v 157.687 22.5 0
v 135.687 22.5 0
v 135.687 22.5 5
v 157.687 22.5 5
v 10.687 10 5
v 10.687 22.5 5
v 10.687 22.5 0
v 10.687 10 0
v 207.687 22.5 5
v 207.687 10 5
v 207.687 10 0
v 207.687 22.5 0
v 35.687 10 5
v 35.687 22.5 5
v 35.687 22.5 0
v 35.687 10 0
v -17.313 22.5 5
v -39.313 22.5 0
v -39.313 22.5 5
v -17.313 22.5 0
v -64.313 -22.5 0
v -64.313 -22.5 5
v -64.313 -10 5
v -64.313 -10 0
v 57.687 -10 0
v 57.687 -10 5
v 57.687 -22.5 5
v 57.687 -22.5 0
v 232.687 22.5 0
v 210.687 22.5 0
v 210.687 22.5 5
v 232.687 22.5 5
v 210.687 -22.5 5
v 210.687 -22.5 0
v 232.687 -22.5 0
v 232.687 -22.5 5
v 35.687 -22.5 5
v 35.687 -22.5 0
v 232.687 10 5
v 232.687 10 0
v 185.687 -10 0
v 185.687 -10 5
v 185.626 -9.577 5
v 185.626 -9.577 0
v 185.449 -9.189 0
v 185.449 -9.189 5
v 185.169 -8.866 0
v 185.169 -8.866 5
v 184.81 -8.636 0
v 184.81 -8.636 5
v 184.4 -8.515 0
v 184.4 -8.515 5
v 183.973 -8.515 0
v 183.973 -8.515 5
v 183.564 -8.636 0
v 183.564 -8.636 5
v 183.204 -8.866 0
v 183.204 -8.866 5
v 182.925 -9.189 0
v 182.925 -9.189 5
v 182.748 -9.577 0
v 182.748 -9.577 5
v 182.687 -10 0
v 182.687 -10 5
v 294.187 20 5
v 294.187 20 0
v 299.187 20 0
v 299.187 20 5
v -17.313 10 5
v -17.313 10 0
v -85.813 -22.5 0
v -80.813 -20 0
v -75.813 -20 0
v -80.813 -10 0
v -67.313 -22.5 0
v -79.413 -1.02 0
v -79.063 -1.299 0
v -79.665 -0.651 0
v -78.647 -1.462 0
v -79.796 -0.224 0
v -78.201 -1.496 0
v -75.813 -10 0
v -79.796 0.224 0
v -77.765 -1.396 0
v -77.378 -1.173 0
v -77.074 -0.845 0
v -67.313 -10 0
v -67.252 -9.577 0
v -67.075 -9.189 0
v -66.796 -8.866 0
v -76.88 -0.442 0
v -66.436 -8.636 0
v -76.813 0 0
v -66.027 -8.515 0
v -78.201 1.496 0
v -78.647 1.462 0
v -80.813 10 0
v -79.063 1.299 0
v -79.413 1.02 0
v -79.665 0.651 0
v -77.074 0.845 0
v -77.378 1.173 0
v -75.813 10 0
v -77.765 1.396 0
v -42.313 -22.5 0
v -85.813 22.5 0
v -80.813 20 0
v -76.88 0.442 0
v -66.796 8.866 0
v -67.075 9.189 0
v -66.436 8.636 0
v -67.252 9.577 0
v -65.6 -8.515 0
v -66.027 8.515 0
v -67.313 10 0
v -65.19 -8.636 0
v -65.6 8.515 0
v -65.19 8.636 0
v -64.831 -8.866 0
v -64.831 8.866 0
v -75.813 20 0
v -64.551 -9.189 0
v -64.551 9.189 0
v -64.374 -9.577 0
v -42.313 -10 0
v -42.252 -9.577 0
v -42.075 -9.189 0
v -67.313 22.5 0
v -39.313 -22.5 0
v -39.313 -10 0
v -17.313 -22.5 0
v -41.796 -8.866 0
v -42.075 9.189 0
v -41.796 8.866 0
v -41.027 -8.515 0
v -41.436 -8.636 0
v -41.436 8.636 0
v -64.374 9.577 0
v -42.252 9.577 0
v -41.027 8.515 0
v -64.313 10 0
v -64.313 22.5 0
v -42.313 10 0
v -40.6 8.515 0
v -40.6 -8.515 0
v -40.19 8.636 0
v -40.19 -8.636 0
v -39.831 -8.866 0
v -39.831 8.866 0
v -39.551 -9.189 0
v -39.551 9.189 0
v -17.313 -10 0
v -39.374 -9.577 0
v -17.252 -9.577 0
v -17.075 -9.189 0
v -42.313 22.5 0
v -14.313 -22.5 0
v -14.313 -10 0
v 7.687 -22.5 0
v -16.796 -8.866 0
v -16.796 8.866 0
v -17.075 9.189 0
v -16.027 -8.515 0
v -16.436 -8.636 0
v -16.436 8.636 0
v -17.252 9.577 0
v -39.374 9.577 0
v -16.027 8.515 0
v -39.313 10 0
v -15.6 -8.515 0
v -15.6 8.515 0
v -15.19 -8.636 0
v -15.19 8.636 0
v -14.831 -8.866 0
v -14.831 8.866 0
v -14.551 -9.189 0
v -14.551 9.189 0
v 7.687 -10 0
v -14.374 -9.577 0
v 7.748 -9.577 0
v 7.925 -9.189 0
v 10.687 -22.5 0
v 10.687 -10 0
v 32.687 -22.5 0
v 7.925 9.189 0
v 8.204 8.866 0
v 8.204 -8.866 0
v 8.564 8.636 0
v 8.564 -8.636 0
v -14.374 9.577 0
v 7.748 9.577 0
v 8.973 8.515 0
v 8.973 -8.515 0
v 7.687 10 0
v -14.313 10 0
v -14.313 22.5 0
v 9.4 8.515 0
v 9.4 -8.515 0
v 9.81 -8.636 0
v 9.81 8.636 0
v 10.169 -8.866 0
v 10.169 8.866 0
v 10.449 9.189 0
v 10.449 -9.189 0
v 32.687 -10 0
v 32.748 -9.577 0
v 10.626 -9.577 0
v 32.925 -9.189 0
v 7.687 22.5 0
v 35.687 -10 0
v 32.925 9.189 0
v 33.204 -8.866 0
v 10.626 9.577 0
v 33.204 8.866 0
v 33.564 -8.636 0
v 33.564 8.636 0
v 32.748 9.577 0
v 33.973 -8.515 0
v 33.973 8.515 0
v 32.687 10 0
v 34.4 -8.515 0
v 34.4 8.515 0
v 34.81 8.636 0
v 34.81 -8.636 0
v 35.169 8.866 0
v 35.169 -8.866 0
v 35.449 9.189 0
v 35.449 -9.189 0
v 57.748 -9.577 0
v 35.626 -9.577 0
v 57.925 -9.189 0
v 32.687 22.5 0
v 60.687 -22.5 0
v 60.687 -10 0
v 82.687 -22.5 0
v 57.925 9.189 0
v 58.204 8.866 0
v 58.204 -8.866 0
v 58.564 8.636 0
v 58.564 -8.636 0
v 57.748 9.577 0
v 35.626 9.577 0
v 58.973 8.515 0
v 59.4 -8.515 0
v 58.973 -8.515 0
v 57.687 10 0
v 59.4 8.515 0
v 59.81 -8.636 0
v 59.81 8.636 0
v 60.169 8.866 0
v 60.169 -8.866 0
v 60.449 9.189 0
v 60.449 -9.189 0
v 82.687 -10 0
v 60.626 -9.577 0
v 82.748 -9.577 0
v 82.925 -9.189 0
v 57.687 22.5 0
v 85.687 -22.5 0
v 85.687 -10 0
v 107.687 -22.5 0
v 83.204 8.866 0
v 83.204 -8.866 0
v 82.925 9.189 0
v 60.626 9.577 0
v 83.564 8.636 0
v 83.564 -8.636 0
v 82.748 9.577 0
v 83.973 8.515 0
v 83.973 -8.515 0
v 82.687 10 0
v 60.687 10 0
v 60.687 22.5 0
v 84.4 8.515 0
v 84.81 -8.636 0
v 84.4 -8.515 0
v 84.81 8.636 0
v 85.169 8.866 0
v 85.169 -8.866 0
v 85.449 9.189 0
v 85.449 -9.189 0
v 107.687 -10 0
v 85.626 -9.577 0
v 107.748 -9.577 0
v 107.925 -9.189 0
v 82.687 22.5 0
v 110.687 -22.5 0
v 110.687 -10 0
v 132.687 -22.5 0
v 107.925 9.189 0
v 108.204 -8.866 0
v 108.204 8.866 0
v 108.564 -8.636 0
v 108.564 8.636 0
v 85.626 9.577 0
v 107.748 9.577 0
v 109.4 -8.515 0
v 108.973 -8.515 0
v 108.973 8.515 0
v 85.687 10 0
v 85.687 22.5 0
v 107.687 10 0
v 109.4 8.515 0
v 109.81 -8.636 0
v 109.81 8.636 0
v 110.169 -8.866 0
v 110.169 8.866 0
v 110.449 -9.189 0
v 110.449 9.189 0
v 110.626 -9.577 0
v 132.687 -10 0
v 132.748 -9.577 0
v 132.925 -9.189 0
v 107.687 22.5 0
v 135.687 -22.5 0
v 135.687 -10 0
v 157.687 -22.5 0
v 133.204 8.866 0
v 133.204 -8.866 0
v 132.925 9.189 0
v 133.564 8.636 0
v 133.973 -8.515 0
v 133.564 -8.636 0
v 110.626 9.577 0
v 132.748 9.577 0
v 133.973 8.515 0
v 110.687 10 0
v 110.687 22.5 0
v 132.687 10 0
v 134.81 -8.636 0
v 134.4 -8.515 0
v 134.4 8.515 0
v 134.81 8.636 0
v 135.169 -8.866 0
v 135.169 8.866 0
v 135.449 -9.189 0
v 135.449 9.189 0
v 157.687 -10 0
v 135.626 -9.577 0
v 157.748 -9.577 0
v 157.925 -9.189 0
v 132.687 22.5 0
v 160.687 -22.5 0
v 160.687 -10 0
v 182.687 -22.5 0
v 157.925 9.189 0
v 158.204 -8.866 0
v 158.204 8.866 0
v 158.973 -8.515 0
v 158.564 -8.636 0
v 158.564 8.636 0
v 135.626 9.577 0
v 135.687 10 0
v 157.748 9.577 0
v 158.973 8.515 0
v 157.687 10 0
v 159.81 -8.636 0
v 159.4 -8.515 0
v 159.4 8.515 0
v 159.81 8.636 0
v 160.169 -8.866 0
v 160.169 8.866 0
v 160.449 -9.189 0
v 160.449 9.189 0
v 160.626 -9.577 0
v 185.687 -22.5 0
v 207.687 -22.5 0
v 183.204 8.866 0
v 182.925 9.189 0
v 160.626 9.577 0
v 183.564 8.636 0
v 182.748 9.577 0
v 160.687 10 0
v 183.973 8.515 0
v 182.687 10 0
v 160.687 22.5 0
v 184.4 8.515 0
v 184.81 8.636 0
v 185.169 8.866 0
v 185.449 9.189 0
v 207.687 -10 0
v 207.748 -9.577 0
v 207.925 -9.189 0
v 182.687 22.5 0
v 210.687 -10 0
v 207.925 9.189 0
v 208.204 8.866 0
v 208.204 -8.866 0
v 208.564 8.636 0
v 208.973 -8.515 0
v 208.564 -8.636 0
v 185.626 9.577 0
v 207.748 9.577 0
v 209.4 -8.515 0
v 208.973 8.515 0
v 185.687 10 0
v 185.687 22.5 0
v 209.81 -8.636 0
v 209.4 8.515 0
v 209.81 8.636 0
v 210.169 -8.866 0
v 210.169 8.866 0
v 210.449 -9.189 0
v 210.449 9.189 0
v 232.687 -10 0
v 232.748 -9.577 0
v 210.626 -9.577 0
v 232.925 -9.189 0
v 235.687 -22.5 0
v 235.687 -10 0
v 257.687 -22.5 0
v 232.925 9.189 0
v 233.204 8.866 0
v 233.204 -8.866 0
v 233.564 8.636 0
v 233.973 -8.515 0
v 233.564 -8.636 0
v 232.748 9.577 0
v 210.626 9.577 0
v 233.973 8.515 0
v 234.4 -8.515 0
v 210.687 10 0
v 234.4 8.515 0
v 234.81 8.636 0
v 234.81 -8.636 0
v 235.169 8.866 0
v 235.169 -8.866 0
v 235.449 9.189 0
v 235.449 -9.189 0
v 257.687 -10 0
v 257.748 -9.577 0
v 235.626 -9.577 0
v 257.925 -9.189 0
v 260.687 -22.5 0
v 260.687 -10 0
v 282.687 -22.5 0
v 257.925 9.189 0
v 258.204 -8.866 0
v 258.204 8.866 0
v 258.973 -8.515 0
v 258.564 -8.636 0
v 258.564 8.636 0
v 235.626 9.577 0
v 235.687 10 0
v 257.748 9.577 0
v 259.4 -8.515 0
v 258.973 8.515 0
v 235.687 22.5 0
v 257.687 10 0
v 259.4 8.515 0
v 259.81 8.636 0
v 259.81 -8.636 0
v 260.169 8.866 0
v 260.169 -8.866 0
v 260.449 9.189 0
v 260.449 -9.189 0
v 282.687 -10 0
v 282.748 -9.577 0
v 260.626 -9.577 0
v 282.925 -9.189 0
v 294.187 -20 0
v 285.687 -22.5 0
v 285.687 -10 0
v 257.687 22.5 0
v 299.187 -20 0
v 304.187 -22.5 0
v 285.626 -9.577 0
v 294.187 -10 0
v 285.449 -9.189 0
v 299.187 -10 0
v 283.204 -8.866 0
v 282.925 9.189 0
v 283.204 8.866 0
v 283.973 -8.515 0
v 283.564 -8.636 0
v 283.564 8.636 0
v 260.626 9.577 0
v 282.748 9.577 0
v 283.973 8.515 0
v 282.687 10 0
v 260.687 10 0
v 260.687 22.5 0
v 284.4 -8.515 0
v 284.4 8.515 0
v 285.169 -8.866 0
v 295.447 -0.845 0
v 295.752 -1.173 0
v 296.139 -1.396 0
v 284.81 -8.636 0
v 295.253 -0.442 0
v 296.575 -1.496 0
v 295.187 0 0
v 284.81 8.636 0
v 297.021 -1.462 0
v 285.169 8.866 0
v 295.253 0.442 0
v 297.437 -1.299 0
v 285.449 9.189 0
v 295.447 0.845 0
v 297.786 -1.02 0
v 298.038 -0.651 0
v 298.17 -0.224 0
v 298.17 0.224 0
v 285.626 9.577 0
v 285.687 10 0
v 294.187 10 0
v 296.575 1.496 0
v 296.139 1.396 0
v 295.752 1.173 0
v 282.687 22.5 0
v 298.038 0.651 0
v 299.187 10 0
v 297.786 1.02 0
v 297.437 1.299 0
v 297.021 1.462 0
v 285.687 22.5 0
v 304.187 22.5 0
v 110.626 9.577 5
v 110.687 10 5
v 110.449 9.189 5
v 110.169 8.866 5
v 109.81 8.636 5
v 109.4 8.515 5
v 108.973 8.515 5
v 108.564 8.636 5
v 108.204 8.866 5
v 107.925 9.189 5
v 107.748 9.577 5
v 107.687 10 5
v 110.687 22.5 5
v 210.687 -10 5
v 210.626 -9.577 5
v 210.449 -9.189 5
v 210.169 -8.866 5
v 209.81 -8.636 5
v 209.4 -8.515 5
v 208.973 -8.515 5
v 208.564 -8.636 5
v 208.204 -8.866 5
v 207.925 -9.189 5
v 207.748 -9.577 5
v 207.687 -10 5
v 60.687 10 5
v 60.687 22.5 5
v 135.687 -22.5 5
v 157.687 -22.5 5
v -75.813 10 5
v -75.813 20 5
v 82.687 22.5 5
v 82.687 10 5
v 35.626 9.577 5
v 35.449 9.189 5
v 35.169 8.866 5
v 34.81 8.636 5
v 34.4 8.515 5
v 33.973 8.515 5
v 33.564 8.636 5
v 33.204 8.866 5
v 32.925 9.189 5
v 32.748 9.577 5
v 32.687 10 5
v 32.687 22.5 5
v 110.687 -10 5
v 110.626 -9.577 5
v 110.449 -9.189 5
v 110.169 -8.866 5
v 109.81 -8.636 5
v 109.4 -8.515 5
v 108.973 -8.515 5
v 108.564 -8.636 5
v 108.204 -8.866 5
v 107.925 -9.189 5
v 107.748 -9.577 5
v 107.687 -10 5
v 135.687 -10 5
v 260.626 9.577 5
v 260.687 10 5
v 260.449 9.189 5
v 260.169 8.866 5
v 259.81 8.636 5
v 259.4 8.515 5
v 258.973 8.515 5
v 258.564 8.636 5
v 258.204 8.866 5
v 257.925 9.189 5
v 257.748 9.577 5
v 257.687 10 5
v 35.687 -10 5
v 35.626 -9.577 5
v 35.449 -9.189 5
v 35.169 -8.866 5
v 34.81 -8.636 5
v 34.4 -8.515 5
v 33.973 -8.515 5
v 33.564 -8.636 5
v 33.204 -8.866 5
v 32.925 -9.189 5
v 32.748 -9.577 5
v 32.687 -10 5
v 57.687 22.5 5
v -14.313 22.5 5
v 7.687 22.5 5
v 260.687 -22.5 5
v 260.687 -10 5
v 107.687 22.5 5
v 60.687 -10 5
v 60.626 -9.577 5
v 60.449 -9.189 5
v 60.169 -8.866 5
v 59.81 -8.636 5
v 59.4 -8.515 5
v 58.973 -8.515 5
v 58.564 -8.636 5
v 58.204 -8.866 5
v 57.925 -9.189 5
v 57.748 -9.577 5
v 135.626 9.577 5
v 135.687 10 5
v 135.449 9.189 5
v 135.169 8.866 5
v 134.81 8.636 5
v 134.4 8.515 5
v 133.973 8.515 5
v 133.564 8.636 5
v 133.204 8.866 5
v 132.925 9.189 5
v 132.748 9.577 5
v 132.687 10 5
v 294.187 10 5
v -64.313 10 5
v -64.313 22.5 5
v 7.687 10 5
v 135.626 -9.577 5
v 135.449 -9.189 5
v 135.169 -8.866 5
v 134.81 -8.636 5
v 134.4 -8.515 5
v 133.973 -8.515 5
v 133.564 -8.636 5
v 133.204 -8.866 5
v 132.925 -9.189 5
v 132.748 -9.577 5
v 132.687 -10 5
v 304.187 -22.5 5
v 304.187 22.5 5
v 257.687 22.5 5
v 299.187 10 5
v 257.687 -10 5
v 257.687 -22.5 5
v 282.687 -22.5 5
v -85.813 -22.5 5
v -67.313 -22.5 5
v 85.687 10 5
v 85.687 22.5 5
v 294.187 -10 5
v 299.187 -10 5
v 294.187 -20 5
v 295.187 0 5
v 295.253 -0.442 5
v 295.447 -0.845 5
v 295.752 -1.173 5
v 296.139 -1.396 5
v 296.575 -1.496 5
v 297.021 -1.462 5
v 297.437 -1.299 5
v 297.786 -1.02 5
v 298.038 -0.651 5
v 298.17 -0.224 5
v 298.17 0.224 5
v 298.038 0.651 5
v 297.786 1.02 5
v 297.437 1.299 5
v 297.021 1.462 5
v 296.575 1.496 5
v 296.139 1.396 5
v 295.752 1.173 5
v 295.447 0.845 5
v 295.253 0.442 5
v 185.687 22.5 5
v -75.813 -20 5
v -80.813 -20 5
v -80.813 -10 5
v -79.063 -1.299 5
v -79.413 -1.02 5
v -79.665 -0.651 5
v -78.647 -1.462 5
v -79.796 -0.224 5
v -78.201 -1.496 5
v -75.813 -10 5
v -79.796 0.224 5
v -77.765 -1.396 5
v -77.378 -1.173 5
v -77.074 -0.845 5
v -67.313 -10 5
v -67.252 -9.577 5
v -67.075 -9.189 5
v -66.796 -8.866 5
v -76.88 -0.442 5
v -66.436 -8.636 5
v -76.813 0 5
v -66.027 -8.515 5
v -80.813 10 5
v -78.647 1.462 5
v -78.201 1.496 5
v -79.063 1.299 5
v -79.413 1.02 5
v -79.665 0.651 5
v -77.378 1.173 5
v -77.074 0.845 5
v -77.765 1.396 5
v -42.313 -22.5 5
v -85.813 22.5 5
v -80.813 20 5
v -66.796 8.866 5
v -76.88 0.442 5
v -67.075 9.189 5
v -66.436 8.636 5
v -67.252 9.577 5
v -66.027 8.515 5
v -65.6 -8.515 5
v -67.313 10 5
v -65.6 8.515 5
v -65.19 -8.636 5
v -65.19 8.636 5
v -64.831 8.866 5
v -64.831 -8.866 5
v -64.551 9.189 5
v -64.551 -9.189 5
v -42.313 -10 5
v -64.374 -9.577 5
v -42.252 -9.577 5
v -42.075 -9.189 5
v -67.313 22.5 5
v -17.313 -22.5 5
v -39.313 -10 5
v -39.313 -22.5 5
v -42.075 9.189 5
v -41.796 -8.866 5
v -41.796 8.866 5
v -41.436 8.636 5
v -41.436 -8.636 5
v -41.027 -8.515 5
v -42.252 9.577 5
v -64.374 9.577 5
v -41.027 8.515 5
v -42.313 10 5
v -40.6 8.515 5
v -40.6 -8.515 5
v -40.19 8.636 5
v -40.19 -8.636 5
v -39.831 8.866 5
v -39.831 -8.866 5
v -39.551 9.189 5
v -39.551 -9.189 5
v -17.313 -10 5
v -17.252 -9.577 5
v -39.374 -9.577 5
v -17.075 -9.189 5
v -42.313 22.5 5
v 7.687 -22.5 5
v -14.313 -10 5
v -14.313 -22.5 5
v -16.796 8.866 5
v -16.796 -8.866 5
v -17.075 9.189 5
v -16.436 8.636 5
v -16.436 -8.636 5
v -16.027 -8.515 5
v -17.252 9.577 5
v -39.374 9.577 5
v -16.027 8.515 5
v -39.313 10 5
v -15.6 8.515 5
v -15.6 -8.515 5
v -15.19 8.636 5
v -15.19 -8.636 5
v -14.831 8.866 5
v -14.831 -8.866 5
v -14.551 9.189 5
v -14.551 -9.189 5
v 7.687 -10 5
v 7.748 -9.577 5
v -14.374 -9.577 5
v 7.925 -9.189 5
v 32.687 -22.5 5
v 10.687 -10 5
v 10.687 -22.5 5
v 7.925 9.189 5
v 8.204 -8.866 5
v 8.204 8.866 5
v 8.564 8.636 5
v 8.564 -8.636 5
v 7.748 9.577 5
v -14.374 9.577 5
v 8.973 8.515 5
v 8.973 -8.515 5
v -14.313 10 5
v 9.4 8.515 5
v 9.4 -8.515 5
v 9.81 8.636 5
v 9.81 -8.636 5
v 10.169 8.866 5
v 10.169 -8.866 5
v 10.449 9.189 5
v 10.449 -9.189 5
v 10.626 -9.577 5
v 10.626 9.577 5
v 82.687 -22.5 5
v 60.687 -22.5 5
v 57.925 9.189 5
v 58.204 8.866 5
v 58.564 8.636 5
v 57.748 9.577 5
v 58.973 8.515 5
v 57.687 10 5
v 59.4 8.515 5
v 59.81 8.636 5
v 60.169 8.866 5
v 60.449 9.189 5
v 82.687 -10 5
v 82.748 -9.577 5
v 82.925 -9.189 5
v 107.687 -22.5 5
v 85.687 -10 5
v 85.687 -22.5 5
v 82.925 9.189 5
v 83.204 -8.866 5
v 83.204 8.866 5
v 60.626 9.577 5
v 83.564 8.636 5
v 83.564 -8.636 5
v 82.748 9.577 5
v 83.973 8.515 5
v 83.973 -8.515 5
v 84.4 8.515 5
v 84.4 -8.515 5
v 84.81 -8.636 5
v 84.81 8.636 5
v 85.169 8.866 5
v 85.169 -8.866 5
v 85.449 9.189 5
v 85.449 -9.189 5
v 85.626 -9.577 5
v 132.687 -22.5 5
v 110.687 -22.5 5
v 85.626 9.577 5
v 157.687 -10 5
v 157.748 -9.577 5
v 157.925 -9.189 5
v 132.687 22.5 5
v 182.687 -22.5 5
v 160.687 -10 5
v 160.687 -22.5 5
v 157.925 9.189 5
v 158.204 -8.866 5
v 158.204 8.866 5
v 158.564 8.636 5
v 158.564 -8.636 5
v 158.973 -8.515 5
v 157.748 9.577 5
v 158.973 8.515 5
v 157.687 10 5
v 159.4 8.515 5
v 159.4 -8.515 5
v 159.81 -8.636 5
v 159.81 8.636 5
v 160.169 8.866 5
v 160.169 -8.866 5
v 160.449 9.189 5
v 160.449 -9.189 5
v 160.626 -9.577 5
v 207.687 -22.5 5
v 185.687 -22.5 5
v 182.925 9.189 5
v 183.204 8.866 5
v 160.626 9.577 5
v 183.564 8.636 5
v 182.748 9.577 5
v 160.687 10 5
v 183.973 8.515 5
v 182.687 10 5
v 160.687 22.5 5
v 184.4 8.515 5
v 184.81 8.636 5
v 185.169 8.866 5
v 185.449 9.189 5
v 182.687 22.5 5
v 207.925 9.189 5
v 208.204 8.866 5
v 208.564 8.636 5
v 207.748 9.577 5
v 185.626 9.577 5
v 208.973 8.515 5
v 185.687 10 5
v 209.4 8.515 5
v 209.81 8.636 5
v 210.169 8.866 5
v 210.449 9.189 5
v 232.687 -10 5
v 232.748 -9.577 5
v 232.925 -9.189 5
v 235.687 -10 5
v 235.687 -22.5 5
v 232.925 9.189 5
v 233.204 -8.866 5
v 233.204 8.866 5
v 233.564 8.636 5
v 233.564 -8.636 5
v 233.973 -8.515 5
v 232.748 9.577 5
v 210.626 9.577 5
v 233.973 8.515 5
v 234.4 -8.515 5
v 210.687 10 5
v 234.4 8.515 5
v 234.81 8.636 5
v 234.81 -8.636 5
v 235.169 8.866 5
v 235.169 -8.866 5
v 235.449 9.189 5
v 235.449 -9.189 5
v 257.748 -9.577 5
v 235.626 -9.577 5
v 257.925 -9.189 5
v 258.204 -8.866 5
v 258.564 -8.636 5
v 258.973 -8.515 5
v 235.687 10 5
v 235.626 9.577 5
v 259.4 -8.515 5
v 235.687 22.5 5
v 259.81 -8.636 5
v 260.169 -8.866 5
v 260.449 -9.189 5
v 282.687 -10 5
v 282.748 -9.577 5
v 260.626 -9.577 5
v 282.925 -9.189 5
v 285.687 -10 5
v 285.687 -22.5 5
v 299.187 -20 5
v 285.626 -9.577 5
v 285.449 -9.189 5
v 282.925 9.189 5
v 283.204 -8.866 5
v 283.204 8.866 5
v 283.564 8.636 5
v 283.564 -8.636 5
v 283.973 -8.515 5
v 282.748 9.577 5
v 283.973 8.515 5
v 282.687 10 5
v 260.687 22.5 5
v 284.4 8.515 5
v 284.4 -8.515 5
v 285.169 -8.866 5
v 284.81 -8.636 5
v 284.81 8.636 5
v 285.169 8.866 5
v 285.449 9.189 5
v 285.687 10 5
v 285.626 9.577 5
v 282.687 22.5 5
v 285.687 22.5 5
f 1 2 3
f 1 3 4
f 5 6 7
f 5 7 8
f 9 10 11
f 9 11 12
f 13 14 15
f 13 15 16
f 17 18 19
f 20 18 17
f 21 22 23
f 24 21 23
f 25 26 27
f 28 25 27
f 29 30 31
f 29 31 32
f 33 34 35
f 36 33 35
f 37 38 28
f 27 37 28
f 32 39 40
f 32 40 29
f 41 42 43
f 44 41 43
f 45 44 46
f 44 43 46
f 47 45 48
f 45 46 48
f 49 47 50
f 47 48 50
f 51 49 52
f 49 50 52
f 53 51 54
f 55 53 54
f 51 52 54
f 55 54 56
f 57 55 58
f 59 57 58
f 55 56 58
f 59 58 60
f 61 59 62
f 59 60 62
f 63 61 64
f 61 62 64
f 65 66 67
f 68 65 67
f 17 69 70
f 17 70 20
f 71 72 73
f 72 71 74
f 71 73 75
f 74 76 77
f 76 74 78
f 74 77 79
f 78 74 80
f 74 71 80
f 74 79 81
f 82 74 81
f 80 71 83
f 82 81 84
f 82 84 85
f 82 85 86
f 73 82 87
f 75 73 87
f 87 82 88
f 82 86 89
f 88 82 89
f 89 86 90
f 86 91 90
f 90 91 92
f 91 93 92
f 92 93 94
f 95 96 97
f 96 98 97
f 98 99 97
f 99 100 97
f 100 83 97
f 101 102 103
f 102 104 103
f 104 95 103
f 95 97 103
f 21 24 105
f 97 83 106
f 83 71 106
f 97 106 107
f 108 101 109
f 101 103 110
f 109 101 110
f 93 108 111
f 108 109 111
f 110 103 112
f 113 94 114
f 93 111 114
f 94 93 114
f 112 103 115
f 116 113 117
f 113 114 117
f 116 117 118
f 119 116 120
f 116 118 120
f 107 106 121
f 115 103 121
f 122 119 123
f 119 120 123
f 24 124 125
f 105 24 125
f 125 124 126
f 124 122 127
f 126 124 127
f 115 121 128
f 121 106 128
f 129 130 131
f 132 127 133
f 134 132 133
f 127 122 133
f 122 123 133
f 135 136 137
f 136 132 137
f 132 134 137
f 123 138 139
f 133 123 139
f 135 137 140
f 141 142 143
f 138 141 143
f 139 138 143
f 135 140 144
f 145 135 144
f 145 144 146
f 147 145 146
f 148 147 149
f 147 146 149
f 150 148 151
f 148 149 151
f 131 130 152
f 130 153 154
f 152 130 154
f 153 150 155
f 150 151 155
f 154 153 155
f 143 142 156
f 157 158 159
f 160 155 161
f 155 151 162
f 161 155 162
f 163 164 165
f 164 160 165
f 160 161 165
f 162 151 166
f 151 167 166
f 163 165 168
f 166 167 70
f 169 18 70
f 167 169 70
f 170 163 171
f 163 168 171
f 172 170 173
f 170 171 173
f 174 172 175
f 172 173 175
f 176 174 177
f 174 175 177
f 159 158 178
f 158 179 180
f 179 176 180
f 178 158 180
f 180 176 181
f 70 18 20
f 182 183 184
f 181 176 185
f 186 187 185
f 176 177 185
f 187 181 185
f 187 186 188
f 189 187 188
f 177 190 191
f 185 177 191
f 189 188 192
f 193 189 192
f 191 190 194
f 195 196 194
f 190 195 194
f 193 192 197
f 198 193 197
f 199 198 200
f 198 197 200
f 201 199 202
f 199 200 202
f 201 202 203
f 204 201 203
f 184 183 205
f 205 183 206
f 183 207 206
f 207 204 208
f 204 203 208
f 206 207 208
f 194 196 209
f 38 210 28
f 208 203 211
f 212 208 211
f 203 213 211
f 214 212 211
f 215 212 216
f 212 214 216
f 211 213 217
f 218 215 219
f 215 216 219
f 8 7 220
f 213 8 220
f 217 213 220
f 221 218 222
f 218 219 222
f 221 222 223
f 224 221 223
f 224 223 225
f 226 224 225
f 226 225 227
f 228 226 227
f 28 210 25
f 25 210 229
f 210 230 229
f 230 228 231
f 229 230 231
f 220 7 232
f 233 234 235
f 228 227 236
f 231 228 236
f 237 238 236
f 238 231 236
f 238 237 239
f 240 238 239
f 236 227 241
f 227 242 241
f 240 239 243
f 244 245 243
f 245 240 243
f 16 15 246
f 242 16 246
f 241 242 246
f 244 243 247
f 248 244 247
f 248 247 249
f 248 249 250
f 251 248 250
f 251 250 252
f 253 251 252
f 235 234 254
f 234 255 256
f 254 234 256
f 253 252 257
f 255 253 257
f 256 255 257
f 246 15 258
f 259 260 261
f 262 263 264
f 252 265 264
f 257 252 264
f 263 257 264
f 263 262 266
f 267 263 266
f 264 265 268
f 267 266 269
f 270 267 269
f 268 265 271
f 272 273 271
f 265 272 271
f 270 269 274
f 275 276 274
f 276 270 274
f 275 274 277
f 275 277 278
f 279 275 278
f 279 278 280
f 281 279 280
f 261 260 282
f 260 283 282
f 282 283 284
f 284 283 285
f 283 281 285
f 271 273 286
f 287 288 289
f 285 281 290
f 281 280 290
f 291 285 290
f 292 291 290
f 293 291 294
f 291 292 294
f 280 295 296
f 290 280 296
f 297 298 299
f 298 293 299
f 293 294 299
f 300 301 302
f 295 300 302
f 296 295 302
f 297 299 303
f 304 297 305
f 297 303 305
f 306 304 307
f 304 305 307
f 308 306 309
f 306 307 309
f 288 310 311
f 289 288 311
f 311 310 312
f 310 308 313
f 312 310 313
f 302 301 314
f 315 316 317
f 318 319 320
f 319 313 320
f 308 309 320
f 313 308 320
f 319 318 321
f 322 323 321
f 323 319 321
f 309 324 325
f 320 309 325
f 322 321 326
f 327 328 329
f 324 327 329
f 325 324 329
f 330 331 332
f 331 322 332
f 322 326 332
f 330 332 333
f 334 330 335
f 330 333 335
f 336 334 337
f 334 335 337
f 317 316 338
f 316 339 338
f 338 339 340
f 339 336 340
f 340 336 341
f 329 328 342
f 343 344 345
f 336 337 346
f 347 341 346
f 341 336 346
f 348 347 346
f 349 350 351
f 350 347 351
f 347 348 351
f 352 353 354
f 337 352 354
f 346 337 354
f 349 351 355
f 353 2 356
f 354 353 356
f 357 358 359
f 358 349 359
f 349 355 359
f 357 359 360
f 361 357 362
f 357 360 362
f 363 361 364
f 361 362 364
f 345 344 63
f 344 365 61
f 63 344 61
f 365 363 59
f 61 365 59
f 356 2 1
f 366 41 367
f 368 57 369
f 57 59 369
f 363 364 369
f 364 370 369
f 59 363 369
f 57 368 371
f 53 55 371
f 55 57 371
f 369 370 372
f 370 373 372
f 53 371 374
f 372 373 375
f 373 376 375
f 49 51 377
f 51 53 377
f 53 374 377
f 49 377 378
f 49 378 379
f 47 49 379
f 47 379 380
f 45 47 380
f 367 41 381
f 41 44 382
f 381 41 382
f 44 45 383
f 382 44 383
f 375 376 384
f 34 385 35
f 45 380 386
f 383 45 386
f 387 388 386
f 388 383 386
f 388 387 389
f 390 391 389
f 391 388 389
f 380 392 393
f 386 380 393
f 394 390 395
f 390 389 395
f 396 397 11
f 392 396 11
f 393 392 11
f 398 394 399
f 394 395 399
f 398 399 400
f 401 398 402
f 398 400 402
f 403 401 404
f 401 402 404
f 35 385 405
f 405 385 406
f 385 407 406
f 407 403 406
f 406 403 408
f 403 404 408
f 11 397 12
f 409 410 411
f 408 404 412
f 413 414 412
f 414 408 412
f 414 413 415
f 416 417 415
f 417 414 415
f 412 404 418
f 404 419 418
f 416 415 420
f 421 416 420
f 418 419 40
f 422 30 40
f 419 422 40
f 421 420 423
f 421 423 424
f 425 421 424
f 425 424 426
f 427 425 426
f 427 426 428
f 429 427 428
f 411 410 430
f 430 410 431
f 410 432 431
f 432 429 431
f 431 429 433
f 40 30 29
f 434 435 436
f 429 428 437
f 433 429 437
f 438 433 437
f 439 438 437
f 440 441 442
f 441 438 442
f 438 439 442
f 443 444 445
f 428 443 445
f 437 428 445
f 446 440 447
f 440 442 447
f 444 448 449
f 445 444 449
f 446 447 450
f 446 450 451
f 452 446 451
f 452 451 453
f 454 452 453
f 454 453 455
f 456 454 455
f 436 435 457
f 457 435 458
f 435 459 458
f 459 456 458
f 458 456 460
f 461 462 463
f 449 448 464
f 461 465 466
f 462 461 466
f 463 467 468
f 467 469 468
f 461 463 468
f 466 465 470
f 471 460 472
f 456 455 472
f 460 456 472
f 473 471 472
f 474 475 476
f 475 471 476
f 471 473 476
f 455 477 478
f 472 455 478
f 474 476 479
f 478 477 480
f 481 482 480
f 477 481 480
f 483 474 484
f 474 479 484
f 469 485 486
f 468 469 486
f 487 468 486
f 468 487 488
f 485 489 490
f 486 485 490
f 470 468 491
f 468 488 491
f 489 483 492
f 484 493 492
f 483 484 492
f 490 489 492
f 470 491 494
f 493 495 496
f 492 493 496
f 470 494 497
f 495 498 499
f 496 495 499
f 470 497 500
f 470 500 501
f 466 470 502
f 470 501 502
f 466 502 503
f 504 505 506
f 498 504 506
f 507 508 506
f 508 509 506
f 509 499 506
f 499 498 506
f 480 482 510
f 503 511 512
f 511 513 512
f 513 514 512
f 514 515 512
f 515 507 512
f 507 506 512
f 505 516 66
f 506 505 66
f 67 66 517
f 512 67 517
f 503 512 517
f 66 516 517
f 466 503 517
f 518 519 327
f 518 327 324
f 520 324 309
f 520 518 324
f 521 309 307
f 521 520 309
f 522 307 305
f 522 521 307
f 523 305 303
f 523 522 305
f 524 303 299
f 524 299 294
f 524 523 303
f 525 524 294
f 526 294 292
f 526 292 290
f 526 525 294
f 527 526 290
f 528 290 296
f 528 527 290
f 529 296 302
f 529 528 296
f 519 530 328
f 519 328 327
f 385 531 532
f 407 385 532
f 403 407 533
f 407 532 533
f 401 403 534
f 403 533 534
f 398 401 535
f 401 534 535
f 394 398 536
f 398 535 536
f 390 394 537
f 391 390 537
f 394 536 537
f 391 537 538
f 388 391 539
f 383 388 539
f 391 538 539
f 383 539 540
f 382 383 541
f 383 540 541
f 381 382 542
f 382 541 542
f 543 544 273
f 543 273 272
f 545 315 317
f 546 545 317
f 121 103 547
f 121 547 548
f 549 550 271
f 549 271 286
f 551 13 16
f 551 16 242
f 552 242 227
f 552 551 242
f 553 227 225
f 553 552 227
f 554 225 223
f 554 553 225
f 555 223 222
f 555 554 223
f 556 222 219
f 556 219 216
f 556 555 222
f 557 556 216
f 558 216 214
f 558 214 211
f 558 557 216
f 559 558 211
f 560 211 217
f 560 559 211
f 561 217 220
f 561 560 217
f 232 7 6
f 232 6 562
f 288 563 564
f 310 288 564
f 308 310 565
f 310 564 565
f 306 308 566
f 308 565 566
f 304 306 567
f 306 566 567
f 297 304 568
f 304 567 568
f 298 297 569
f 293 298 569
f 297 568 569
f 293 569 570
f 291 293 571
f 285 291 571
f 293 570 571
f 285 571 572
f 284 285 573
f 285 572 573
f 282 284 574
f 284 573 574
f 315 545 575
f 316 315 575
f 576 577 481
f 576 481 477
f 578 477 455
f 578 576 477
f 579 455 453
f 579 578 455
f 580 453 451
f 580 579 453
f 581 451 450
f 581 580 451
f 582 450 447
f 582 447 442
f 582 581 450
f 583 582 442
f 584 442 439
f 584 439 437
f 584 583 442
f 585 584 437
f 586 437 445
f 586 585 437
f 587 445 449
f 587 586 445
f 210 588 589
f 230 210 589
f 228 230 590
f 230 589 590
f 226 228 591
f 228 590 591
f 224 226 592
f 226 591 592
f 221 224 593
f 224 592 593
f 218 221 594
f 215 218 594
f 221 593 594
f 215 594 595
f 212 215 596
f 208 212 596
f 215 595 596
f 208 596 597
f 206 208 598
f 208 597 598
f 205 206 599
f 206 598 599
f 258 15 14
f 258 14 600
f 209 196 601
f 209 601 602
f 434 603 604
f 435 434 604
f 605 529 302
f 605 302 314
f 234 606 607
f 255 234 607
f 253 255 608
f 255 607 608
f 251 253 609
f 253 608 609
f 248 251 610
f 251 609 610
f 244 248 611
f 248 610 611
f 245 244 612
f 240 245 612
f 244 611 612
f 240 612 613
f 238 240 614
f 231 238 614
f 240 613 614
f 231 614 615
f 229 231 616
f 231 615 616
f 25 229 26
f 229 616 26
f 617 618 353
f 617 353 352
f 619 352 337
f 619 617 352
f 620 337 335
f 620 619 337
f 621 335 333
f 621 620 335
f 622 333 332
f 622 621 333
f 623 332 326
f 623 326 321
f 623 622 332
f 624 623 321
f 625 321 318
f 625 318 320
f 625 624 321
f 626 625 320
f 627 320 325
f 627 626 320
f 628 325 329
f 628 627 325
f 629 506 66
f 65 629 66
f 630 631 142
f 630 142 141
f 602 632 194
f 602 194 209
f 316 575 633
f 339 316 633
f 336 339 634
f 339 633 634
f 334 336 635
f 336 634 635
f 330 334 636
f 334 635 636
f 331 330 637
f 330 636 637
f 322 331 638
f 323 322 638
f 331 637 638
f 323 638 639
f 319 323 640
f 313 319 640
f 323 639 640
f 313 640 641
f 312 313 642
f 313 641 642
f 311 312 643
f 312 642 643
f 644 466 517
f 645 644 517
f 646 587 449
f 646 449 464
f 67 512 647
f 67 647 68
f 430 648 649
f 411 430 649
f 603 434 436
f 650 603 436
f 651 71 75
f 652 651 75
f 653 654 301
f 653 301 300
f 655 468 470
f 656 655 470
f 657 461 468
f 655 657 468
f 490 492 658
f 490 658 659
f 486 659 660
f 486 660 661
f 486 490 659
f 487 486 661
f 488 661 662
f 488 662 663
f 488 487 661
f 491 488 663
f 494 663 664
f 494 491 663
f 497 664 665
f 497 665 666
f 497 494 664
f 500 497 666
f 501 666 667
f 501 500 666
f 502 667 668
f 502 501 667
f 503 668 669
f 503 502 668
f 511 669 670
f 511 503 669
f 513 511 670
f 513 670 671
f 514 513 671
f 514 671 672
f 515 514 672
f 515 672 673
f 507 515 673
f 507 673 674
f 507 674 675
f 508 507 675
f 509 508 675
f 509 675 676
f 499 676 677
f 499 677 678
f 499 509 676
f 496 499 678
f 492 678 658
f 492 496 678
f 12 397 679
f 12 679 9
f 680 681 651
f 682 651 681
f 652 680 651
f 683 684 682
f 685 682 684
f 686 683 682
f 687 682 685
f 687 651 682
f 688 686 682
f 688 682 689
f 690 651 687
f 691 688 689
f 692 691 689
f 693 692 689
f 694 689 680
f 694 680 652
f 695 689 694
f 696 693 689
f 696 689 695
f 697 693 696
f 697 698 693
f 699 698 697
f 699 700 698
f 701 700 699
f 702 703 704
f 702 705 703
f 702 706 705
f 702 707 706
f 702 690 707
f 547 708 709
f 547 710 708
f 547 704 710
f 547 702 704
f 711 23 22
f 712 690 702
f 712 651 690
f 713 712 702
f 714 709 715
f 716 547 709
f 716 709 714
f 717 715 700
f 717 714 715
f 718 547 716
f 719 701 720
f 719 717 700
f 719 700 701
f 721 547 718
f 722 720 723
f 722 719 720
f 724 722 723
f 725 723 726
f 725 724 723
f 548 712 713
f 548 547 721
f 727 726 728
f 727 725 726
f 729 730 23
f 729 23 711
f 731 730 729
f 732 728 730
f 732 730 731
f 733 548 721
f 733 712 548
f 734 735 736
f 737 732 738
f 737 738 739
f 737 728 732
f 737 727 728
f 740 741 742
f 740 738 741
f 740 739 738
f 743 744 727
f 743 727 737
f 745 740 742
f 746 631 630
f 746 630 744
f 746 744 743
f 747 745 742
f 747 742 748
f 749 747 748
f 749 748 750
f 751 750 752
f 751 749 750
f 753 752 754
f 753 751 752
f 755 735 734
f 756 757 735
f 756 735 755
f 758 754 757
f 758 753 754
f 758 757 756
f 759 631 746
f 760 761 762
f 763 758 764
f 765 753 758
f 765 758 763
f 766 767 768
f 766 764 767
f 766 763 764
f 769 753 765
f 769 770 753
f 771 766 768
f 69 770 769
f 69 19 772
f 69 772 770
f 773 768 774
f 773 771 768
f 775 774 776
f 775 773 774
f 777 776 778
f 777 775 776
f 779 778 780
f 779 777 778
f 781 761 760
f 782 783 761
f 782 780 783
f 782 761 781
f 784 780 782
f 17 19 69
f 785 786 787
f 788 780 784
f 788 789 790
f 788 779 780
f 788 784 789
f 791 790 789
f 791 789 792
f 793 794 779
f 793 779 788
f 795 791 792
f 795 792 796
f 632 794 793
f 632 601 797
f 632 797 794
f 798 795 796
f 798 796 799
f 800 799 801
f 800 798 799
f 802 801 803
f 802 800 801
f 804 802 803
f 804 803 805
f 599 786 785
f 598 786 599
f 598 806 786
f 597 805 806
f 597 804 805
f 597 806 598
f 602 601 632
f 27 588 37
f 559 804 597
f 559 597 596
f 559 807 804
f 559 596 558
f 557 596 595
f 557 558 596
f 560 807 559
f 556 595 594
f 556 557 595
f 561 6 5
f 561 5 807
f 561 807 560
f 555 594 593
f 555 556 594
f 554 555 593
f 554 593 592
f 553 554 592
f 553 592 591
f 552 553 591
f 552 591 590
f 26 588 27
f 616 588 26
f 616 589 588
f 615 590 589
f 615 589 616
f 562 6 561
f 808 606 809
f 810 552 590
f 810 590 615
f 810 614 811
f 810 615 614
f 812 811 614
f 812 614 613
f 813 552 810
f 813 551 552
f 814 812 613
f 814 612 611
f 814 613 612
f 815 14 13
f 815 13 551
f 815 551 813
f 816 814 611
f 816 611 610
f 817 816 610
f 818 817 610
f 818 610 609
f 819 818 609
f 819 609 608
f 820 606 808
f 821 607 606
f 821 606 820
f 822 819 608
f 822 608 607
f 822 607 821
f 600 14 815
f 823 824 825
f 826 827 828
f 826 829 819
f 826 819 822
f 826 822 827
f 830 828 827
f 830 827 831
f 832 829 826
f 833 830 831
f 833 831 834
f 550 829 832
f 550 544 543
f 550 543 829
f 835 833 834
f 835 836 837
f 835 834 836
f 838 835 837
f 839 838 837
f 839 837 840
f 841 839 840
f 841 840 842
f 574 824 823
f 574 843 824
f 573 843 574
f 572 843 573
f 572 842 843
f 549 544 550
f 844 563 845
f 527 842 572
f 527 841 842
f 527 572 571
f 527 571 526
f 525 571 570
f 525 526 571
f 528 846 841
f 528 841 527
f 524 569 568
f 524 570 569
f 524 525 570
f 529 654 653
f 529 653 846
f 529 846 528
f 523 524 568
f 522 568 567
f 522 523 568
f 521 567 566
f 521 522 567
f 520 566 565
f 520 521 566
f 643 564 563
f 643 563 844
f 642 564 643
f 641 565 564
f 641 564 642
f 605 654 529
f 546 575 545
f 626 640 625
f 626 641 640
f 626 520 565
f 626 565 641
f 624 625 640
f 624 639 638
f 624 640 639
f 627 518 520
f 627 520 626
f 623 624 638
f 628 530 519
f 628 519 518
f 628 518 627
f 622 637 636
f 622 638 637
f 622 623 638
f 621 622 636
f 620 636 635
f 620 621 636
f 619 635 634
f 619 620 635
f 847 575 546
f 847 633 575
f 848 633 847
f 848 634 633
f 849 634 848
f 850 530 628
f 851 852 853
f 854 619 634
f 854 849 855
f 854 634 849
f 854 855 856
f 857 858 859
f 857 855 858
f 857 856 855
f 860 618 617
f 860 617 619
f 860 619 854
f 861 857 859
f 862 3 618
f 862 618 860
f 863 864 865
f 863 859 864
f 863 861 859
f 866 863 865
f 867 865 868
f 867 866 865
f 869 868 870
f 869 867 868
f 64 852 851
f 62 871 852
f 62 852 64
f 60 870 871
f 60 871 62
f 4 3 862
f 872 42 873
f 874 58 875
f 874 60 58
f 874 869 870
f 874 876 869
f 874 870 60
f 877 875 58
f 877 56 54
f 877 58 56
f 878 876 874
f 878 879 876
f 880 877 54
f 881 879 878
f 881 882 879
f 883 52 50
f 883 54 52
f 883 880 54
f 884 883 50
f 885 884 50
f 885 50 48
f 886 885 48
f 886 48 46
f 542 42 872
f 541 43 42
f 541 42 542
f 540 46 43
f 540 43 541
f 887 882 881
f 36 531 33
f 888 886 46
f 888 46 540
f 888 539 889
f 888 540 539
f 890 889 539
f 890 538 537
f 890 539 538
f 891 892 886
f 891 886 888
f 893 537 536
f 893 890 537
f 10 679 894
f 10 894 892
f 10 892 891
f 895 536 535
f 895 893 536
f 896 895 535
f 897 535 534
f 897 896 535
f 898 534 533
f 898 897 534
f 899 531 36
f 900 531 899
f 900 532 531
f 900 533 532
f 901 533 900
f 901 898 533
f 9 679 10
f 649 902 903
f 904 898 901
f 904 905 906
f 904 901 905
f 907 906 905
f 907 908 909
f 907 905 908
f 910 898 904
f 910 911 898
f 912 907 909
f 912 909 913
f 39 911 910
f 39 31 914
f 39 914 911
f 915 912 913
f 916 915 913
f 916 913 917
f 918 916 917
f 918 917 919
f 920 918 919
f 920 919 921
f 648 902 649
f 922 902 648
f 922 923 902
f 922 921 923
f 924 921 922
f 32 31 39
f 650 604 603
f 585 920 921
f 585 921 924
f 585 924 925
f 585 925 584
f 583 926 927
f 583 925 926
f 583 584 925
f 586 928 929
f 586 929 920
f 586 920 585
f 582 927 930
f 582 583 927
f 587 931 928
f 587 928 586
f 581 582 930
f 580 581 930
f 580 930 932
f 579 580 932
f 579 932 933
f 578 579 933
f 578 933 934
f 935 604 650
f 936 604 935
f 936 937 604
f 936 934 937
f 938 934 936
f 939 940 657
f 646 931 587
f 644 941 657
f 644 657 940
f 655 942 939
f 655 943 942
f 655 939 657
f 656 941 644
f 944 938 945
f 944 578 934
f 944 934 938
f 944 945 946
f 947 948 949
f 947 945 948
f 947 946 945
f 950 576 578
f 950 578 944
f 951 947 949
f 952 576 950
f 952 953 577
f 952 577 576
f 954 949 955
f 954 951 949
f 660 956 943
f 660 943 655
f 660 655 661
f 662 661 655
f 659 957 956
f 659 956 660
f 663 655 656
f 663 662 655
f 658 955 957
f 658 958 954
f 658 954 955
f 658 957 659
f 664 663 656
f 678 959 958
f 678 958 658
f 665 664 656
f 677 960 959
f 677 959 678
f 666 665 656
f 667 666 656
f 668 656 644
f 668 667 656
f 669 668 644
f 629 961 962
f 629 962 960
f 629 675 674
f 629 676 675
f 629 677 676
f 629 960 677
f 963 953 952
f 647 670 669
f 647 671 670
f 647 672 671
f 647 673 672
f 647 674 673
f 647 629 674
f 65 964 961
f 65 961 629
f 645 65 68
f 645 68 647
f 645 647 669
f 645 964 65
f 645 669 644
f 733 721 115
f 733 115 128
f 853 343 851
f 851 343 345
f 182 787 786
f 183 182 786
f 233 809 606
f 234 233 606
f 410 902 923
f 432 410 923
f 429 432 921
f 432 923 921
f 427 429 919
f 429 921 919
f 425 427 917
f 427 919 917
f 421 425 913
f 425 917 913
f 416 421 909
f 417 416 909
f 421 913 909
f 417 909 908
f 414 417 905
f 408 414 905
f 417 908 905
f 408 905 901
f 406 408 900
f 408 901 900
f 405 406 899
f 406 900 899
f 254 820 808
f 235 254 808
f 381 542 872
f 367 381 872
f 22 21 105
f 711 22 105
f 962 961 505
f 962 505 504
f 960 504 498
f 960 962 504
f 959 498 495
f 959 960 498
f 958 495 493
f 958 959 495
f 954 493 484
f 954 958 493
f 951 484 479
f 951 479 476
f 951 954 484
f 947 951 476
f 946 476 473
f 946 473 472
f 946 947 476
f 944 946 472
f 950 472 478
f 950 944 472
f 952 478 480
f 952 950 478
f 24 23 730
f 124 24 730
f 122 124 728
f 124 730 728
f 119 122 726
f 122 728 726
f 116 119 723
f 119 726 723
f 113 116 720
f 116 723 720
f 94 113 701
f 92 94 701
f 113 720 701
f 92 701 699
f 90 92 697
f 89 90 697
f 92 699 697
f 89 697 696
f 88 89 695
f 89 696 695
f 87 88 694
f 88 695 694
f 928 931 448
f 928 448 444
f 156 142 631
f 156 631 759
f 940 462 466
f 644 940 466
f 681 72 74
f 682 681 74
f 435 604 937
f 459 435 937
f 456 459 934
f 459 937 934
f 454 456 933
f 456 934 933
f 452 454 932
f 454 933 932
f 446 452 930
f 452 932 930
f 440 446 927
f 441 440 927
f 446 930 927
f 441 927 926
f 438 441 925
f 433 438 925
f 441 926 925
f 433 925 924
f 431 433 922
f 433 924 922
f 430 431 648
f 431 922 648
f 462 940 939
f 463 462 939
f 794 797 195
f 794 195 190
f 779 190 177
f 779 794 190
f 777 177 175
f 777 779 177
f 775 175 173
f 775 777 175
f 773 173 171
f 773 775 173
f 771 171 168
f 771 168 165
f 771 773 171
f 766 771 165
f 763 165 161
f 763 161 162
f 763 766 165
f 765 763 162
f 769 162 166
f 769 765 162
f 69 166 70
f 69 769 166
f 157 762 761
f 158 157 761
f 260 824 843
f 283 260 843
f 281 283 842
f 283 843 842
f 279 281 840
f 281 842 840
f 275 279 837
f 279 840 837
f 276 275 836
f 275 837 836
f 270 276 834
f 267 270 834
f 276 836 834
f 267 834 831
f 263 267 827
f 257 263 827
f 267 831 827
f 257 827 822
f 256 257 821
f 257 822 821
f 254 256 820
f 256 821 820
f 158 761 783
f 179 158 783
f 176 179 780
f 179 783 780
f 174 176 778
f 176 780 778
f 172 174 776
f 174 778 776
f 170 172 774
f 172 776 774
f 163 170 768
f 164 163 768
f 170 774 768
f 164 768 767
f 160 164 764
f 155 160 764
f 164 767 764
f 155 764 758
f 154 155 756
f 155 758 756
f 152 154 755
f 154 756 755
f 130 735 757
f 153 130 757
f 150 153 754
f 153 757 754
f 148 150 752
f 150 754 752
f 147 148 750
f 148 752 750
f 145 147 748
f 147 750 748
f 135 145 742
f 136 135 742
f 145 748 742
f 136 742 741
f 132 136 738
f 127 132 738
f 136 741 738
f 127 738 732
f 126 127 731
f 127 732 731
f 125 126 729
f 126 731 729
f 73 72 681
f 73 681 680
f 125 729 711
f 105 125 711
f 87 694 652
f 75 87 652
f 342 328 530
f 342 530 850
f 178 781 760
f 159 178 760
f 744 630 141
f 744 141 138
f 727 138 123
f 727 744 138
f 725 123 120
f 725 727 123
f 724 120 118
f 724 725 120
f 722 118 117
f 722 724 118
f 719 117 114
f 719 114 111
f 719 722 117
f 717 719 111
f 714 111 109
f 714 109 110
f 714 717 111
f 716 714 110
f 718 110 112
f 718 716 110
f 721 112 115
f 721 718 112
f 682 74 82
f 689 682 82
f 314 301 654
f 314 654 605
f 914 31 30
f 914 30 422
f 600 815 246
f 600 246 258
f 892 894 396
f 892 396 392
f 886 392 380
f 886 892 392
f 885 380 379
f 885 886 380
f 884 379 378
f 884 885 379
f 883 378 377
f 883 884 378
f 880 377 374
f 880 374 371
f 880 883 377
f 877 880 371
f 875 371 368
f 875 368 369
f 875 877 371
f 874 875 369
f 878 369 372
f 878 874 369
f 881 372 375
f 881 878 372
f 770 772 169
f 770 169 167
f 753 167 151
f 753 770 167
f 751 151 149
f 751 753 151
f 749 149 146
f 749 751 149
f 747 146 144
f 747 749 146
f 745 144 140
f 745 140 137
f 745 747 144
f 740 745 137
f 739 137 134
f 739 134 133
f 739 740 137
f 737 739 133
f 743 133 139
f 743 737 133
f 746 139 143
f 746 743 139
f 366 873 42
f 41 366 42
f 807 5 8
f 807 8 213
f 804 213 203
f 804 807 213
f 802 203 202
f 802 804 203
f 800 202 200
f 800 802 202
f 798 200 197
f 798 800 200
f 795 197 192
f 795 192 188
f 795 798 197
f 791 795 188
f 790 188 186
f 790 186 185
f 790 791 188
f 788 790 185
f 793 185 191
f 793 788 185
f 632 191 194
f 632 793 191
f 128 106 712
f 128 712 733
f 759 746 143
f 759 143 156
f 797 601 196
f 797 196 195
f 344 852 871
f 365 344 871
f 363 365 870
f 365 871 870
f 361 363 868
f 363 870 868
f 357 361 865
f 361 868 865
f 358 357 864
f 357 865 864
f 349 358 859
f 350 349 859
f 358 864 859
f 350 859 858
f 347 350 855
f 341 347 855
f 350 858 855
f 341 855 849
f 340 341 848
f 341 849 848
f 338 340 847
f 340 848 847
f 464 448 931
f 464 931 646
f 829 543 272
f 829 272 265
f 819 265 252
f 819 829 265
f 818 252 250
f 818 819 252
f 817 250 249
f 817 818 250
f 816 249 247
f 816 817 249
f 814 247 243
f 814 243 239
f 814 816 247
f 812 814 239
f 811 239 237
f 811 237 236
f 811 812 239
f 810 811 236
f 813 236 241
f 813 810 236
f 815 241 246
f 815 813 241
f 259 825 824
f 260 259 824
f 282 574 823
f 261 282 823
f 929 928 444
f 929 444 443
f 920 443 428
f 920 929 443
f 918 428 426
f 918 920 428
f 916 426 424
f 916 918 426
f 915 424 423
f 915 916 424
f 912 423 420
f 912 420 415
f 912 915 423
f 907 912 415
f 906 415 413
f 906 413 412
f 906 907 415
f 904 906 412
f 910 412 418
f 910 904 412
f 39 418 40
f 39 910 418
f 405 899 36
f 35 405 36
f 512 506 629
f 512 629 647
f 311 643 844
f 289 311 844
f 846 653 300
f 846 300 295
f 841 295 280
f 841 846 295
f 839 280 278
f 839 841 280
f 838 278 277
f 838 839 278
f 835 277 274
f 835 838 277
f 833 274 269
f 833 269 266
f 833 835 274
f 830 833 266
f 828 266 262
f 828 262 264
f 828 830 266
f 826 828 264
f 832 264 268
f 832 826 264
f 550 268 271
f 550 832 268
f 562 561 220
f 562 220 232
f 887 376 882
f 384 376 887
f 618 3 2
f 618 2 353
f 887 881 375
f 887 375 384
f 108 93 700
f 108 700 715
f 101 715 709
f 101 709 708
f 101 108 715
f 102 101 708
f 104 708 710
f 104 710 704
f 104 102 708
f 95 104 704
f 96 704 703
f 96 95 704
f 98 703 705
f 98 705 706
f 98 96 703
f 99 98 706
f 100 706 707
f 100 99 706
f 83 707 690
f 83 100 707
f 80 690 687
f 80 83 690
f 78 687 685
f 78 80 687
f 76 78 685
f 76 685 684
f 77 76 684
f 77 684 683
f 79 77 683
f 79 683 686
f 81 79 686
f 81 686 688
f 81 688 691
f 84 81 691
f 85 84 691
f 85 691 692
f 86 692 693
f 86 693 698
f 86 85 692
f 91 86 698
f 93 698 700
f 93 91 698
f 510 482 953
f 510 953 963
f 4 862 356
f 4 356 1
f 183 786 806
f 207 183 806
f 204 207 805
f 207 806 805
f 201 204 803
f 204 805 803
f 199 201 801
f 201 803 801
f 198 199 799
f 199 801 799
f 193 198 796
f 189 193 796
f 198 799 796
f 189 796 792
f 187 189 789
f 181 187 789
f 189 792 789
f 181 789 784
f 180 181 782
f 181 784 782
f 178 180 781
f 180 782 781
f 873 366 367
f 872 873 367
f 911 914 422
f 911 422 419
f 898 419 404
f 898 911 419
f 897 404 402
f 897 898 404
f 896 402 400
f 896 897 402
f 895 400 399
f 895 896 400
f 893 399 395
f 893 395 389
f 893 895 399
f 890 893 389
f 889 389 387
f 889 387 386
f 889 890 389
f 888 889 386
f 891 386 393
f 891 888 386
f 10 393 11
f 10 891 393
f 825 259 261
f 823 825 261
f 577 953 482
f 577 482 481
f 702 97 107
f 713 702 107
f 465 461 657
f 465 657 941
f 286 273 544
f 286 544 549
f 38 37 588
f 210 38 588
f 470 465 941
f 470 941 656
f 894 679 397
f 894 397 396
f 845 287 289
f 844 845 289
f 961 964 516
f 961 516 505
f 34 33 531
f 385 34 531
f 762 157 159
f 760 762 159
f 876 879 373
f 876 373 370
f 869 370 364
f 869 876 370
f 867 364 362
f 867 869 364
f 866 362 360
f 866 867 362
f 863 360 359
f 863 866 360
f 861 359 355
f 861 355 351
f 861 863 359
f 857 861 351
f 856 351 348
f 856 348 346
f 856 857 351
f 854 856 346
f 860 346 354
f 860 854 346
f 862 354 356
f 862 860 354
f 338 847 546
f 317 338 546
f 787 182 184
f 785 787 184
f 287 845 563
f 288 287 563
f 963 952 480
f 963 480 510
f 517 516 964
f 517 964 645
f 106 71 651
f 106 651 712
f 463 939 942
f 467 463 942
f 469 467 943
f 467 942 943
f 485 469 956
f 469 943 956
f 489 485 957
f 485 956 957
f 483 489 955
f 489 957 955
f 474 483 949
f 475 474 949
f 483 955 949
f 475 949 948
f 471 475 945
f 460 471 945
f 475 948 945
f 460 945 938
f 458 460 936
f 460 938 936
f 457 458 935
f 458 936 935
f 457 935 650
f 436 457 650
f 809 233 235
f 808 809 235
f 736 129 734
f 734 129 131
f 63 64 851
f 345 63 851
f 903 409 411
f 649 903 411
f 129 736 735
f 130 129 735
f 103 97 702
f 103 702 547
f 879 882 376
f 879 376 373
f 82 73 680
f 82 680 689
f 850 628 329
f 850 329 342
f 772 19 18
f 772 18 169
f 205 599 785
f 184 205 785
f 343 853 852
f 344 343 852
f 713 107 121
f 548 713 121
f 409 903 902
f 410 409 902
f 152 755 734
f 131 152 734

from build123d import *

# Parameters (mm, degrees)
SKETCH1_W           = 390
SKETCH1_H           = 45
SKETCH1_R           = 1.5
SKETCH1_W_2         = 5
SKETCH1_H_2         = 10
BOSS_EXTRUDE1_DEPTH = 5
CUT_EXTRUDE1_DEPTH  = 5


with BuildPart() as part:
    # Sketch1 → Boss-Extrude1 (new body)
    with BuildSketch(Plane.XY):
        with Locations((109.186746988, 0)):
            Rectangle(SKETCH1_W, SKETCH1_H)
        with Locations((-78.313253012, 0)):
            Circle(SKETCH1_R, mode=Mode.SUBTRACT)
        with Locations(Location((296.686746988, 0, 0), (0, 0, 180))):
            Circle(SKETCH1_R, mode=Mode.SUBTRACT)
        with Locations((-78.313253012, -15)):
            Rectangle(SKETCH1_W_2, SKETCH1_H_2, mode=Mode.SUBTRACT)
        with Locations((-78.313253012, 15)):
            Rectangle(SKETCH1_W_2, SKETCH1_H_2, mode=Mode.SUBTRACT)
        with Locations((296.686746988, -15)):
            Rectangle(SKETCH1_W_2, SKETCH1_H_2, mode=Mode.SUBTRACT)
        with Locations((296.686746988, 15)):
            Rectangle(SKETCH1_W_2, SKETCH1_H_2, mode=Mode.SUBTRACT)
    extrude(amount=BOSS_EXTRUDE1_DEPTH)

    # Sketch2 → Cut-Extrude1 (cut)
    with BuildSketch(Plane.XY.offset(5)):
        with BuildLine():
            Line((-67.313253012, 22.5), (-64.313253012, 22.5))
            Line((-64.313253012, 22.5), (-64.313253012, 10))
            ThreePointArc((-64.313253012, 10), (-65.813253012, 8.5), (-67.313253012, 10))
            Line((-67.313253012, 10), (-67.313253012, 22.5))
        make_face()
        with BuildLine():
            Line((-42.313253012, 22.5), (-39.313253012, 22.5))
            Line((-39.313253012, 22.5), (-39.313253012, 10))
            ThreePointArc((-39.313253012, 10), (-40.813253012, 8.5), (-42.313253012, 10))
            Line((-42.313253012, 10), (-42.313253012, 22.5))
        make_face()
        with BuildLine():
            Line((-17.313253012, 22.5), (-14.313253012, 22.5))
            Line((-14.313253012, 22.5), (-14.313253012, 10))
            ThreePointArc((-14.313253012, 10), (-15.813253012, 8.5), (-17.313253012, 10))
            Line((-17.313253012, 10), (-17.313253012, 22.5))
        make_face()
        with BuildLine():
            Line((7.686746988, 22.5), (10.686746988, 22.5))
            Line((10.686746988, 22.5), (10.686746988, 10))
            ThreePointArc((10.686746988, 10), (9.186746988, 8.5), (7.686746988, 10))
            Line((7.686746988, 10), (7.686746988, 22.5))
        make_face()
        with BuildLine():
            Line((32.686746988, 22.5), (35.686746988, 22.5))
            Line((35.686746988, 22.5), (35.686746988, 10))
            ThreePointArc((35.686746988, 10), (34.186746988, 8.5), (32.686746988, 10))
            Line((32.686746988, 10), (32.686746988, 22.5))
        make_face()
        with BuildLine():
            Line((57.686746988, 22.5), (60.686746988, 22.5))
            Line((60.686746988, 22.5), (60.686746988, 10))
            ThreePointArc((60.686746988, 10), (59.186746988, 8.5), (57.686746988, 10))
            Line((57.686746988, 10), (57.686746988, 22.5))
        make_face()
        with BuildLine():
            Line((82.686746988, 22.5), (85.686746988, 22.5))
            Line((85.686746988, 22.5), (85.686746988, 10))
            ThreePointArc((85.686746988, 10), (84.186746988, 8.5), (82.686746988, 10))
            Line((82.686746988, 10), (82.686746988, 22.5))
        make_face()
        with BuildLine():
            Line((107.686746988, 22.5), (110.686746988, 22.5))
            Line((110.686746988, 22.5), (110.686746988, 10))
            ThreePointArc((110.686746988, 10), (109.186746988, 8.5), (107.686746988, 10))
            Line((107.686746988, 10), (107.686746988, 22.5))
        make_face()
        with BuildLine():
            Line((132.686746988, 22.5), (135.686746988, 22.5))
            Line((135.686746988, 22.5), (135.686746988, 10))
            ThreePointArc((135.686746988, 10), (134.186746988, 8.5), (132.686746988, 10))
            Line((132.686746988, 10), (132.686746988, 22.5))
        make_face()
        with BuildLine():
            Line((157.686746988, 22.5), (160.686746988, 22.5))
            Line((160.686746988, 22.5), (160.686746988, 10))
            ThreePointArc((160.686746988, 10), (159.186746988, 8.5), (157.686746988, 10))
            Line((157.686746988, 10), (157.686746988, 22.5))
        make_face()
        with BuildLine():
            Line((182.686746988, 22.5), (185.686746988, 22.5))
            Line((185.686746988, 22.5), (185.686746988, 10))
            ThreePointArc((185.686746988, 10), (184.186746988, 8.5), (182.686746988, 10))
            Line((182.686746988, 10), (182.686746988, 22.5))
        make_face()
        with BuildLine():
            Line((207.686746988, 22.5), (210.686746988, 22.5))
            Line((210.686746988, 22.5), (210.686746988, 10))
            ThreePointArc((210.686746988, 10), (209.186746988, 8.5), (207.686746988, 10))
            Line((207.686746988, 10), (207.686746988, 22.5))
        make_face()
        with BuildLine():
            Line((232.686746988, 22.5), (235.686746988, 22.5))
            Line((235.686746988, 22.5), (235.686746988, 10))
            ThreePointArc((235.686746988, 10), (234.186746988, 8.5), (232.686746988, 10))
            Line((232.686746988, 10), (232.686746988, 22.5))
        make_face()
        with BuildLine():
            Line((257.686746988, 22.5), (260.686746988, 22.5))
            Line((260.686746988, 22.5), (260.686746988, 10))
            ThreePointArc((260.686746988, 10), (259.186746988, 8.5), (257.686746988, 10))
            Line((257.686746988, 10), (257.686746988, 22.5))
        make_face()
        with BuildLine():
            Line((282.686746988, 22.5), (285.686746988, 22.5))
            Line((285.686746988, 22.5), (285.686746988, 10))
            ThreePointArc((285.686746988, 10), (284.186746988, 8.5), (282.686746988, 10))
            Line((282.686746988, 10), (282.686746988, 22.5))
        make_face()
        with BuildLine():
            Line((285.686746988, -22.5), (285.686746988, -10))
            ThreePointArc((285.686746988, -10), (284.186746988, -8.5), (282.686746988, -10))
            Line((282.686746988, -10), (282.686746988, -22.5))
            Line((282.686746988, -22.5), (285.686746988, -22.5))
        make_face()
        with BuildLine():
            Line((260.686746988, -22.5), (260.686746988, -10))
            ThreePointArc((260.686746988, -10), (259.186746988, -8.5), (257.686746988, -10))
            Line((257.686746988, -10), (257.686746988, -22.5))
            Line((257.686746988, -22.5), (260.686746988, -22.5))
        make_face()
        with BuildLine():
            Line((235.686746988, -22.5), (235.686746988, -10))
            ThreePointArc((235.686746988, -10), (234.186746988, -8.5), (232.686746988, -10))
            Line((232.686746988, -10), (232.686746988, -22.5))
            Line((232.686746988, -22.5), (235.686746988, -22.5))
        make_face()
        with BuildLine():
            Line((210.686746988, -22.5), (210.686746988, -10))
            ThreePointArc((210.686746988, -10), (209.186746988, -8.5), (207.686746988, -10))
            Line((207.686746988, -10), (207.686746988, -22.5))
            Line((207.686746988, -22.5), (210.686746988, -22.5))
        make_face()
        with BuildLine():
            Line((185.686746988, -22.5), (185.686746988, -10))
            ThreePointArc((185.686746988, -10), (184.186746988, -8.5), (182.686746988, -10))
            Line((182.686746988, -10), (182.686746988, -22.5))
            Line((182.686746988, -22.5), (185.686746988, -22.5))
        make_face()
        with BuildLine():
            Line((160.686746988, -22.5), (160.686746988, -10))
            ThreePointArc((160.686746988, -10), (159.186746988, -8.5), (157.686746988, -10))
            Line((157.686746988, -10), (157.686746988, -22.5))
            Line((157.686746988, -22.5), (160.686746988, -22.5))
        make_face()
        with BuildLine():
            Line((135.686746988, -22.5), (135.686746988, -10))
            ThreePointArc((135.686746988, -10), (134.186746988, -8.5), (132.686746988, -10))
            Line((132.686746988, -10), (132.686746988, -22.5))
            Line((132.686746988, -22.5), (135.686746988, -22.5))
        make_face()
        with BuildLine():
            Line((110.686746988, -22.5), (110.686746988, -10))
            ThreePointArc((110.686746988, -10), (109.186746988, -8.5), (107.686746988, -10))
            Line((107.686746988, -10), (107.686746988, -22.5))
            Line((107.686746988, -22.5), (110.686746988, -22.5))
        make_face()
        with BuildLine():
            Line((85.686746988, -22.5), (85.686746988, -10))
            ThreePointArc((85.686746988, -10), (84.186746988, -8.5), (82.686746988, -10))
            Line((82.686746988, -10), (82.686746988, -22.5))
            Line((82.686746988, -22.5), (85.686746988, -22.5))
        make_face()
        with BuildLine():
            Line((60.686746988, -22.5), (60.686746988, -10))
            ThreePointArc((60.686746988, -10), (59.186746988, -8.5), (57.686746988, -10))
            Line((57.686746988, -10), (57.686746988, -22.5))
            Line((57.686746988, -22.5), (60.686746988, -22.5))
        make_face()
        with BuildLine():
            Line((35.686746988, -22.5), (35.686746988, -10))
            ThreePointArc((35.686746988, -10), (34.186746988, -8.5), (32.686746988, -10))
            Line((32.686746988, -10), (32.686746988, -22.5))
            Line((32.686746988, -22.5), (35.686746988, -22.5))
        make_face()
        with BuildLine():
            Line((10.686746988, -22.5), (10.686746988, -10))
            ThreePointArc((10.686746988, -10), (9.186746988, -8.5), (7.686746988, -10))
            Line((7.686746988, -10), (7.686746988, -22.5))
            Line((7.686746988, -22.5), (10.686746988, -22.5))
        make_face()
        with BuildLine():
            Line((-14.313253012, -22.5), (-14.313253012, -10))
            ThreePointArc((-14.313253012, -10), (-15.813253012, -8.5), (-17.313253012, -10))
            Line((-17.313253012, -10), (-17.313253012, -22.5))
            Line((-17.313253012, -22.5), (-14.313253012, -22.5))
        make_face()
        with BuildLine():
            Line((-39.313253012, -22.5), (-39.313253012, -10))
            ThreePointArc((-39.313253012, -10), (-40.813253012, -8.5), (-42.313253012, -10))
            Line((-42.313253012, -10), (-42.313253012, -22.5))
            Line((-42.313253012, -22.5), (-39.313253012, -22.5))
        make_face()
        with BuildLine():
            Line((-64.313253012, -22.5), (-64.313253012, -10))
            ThreePointArc((-64.313253012, -10), (-65.813253012, -8.5), (-67.313253012, -10))
            Line((-67.313253012, -10), (-67.313253012, -22.5))
            Line((-67.313253012, -22.5), (-64.313253012, -22.5))
        make_face()
    extrude(amount=-CUT_EXTRUDE1_DEPTH, mode=Mode.SUBTRACT)


solid = part.part
